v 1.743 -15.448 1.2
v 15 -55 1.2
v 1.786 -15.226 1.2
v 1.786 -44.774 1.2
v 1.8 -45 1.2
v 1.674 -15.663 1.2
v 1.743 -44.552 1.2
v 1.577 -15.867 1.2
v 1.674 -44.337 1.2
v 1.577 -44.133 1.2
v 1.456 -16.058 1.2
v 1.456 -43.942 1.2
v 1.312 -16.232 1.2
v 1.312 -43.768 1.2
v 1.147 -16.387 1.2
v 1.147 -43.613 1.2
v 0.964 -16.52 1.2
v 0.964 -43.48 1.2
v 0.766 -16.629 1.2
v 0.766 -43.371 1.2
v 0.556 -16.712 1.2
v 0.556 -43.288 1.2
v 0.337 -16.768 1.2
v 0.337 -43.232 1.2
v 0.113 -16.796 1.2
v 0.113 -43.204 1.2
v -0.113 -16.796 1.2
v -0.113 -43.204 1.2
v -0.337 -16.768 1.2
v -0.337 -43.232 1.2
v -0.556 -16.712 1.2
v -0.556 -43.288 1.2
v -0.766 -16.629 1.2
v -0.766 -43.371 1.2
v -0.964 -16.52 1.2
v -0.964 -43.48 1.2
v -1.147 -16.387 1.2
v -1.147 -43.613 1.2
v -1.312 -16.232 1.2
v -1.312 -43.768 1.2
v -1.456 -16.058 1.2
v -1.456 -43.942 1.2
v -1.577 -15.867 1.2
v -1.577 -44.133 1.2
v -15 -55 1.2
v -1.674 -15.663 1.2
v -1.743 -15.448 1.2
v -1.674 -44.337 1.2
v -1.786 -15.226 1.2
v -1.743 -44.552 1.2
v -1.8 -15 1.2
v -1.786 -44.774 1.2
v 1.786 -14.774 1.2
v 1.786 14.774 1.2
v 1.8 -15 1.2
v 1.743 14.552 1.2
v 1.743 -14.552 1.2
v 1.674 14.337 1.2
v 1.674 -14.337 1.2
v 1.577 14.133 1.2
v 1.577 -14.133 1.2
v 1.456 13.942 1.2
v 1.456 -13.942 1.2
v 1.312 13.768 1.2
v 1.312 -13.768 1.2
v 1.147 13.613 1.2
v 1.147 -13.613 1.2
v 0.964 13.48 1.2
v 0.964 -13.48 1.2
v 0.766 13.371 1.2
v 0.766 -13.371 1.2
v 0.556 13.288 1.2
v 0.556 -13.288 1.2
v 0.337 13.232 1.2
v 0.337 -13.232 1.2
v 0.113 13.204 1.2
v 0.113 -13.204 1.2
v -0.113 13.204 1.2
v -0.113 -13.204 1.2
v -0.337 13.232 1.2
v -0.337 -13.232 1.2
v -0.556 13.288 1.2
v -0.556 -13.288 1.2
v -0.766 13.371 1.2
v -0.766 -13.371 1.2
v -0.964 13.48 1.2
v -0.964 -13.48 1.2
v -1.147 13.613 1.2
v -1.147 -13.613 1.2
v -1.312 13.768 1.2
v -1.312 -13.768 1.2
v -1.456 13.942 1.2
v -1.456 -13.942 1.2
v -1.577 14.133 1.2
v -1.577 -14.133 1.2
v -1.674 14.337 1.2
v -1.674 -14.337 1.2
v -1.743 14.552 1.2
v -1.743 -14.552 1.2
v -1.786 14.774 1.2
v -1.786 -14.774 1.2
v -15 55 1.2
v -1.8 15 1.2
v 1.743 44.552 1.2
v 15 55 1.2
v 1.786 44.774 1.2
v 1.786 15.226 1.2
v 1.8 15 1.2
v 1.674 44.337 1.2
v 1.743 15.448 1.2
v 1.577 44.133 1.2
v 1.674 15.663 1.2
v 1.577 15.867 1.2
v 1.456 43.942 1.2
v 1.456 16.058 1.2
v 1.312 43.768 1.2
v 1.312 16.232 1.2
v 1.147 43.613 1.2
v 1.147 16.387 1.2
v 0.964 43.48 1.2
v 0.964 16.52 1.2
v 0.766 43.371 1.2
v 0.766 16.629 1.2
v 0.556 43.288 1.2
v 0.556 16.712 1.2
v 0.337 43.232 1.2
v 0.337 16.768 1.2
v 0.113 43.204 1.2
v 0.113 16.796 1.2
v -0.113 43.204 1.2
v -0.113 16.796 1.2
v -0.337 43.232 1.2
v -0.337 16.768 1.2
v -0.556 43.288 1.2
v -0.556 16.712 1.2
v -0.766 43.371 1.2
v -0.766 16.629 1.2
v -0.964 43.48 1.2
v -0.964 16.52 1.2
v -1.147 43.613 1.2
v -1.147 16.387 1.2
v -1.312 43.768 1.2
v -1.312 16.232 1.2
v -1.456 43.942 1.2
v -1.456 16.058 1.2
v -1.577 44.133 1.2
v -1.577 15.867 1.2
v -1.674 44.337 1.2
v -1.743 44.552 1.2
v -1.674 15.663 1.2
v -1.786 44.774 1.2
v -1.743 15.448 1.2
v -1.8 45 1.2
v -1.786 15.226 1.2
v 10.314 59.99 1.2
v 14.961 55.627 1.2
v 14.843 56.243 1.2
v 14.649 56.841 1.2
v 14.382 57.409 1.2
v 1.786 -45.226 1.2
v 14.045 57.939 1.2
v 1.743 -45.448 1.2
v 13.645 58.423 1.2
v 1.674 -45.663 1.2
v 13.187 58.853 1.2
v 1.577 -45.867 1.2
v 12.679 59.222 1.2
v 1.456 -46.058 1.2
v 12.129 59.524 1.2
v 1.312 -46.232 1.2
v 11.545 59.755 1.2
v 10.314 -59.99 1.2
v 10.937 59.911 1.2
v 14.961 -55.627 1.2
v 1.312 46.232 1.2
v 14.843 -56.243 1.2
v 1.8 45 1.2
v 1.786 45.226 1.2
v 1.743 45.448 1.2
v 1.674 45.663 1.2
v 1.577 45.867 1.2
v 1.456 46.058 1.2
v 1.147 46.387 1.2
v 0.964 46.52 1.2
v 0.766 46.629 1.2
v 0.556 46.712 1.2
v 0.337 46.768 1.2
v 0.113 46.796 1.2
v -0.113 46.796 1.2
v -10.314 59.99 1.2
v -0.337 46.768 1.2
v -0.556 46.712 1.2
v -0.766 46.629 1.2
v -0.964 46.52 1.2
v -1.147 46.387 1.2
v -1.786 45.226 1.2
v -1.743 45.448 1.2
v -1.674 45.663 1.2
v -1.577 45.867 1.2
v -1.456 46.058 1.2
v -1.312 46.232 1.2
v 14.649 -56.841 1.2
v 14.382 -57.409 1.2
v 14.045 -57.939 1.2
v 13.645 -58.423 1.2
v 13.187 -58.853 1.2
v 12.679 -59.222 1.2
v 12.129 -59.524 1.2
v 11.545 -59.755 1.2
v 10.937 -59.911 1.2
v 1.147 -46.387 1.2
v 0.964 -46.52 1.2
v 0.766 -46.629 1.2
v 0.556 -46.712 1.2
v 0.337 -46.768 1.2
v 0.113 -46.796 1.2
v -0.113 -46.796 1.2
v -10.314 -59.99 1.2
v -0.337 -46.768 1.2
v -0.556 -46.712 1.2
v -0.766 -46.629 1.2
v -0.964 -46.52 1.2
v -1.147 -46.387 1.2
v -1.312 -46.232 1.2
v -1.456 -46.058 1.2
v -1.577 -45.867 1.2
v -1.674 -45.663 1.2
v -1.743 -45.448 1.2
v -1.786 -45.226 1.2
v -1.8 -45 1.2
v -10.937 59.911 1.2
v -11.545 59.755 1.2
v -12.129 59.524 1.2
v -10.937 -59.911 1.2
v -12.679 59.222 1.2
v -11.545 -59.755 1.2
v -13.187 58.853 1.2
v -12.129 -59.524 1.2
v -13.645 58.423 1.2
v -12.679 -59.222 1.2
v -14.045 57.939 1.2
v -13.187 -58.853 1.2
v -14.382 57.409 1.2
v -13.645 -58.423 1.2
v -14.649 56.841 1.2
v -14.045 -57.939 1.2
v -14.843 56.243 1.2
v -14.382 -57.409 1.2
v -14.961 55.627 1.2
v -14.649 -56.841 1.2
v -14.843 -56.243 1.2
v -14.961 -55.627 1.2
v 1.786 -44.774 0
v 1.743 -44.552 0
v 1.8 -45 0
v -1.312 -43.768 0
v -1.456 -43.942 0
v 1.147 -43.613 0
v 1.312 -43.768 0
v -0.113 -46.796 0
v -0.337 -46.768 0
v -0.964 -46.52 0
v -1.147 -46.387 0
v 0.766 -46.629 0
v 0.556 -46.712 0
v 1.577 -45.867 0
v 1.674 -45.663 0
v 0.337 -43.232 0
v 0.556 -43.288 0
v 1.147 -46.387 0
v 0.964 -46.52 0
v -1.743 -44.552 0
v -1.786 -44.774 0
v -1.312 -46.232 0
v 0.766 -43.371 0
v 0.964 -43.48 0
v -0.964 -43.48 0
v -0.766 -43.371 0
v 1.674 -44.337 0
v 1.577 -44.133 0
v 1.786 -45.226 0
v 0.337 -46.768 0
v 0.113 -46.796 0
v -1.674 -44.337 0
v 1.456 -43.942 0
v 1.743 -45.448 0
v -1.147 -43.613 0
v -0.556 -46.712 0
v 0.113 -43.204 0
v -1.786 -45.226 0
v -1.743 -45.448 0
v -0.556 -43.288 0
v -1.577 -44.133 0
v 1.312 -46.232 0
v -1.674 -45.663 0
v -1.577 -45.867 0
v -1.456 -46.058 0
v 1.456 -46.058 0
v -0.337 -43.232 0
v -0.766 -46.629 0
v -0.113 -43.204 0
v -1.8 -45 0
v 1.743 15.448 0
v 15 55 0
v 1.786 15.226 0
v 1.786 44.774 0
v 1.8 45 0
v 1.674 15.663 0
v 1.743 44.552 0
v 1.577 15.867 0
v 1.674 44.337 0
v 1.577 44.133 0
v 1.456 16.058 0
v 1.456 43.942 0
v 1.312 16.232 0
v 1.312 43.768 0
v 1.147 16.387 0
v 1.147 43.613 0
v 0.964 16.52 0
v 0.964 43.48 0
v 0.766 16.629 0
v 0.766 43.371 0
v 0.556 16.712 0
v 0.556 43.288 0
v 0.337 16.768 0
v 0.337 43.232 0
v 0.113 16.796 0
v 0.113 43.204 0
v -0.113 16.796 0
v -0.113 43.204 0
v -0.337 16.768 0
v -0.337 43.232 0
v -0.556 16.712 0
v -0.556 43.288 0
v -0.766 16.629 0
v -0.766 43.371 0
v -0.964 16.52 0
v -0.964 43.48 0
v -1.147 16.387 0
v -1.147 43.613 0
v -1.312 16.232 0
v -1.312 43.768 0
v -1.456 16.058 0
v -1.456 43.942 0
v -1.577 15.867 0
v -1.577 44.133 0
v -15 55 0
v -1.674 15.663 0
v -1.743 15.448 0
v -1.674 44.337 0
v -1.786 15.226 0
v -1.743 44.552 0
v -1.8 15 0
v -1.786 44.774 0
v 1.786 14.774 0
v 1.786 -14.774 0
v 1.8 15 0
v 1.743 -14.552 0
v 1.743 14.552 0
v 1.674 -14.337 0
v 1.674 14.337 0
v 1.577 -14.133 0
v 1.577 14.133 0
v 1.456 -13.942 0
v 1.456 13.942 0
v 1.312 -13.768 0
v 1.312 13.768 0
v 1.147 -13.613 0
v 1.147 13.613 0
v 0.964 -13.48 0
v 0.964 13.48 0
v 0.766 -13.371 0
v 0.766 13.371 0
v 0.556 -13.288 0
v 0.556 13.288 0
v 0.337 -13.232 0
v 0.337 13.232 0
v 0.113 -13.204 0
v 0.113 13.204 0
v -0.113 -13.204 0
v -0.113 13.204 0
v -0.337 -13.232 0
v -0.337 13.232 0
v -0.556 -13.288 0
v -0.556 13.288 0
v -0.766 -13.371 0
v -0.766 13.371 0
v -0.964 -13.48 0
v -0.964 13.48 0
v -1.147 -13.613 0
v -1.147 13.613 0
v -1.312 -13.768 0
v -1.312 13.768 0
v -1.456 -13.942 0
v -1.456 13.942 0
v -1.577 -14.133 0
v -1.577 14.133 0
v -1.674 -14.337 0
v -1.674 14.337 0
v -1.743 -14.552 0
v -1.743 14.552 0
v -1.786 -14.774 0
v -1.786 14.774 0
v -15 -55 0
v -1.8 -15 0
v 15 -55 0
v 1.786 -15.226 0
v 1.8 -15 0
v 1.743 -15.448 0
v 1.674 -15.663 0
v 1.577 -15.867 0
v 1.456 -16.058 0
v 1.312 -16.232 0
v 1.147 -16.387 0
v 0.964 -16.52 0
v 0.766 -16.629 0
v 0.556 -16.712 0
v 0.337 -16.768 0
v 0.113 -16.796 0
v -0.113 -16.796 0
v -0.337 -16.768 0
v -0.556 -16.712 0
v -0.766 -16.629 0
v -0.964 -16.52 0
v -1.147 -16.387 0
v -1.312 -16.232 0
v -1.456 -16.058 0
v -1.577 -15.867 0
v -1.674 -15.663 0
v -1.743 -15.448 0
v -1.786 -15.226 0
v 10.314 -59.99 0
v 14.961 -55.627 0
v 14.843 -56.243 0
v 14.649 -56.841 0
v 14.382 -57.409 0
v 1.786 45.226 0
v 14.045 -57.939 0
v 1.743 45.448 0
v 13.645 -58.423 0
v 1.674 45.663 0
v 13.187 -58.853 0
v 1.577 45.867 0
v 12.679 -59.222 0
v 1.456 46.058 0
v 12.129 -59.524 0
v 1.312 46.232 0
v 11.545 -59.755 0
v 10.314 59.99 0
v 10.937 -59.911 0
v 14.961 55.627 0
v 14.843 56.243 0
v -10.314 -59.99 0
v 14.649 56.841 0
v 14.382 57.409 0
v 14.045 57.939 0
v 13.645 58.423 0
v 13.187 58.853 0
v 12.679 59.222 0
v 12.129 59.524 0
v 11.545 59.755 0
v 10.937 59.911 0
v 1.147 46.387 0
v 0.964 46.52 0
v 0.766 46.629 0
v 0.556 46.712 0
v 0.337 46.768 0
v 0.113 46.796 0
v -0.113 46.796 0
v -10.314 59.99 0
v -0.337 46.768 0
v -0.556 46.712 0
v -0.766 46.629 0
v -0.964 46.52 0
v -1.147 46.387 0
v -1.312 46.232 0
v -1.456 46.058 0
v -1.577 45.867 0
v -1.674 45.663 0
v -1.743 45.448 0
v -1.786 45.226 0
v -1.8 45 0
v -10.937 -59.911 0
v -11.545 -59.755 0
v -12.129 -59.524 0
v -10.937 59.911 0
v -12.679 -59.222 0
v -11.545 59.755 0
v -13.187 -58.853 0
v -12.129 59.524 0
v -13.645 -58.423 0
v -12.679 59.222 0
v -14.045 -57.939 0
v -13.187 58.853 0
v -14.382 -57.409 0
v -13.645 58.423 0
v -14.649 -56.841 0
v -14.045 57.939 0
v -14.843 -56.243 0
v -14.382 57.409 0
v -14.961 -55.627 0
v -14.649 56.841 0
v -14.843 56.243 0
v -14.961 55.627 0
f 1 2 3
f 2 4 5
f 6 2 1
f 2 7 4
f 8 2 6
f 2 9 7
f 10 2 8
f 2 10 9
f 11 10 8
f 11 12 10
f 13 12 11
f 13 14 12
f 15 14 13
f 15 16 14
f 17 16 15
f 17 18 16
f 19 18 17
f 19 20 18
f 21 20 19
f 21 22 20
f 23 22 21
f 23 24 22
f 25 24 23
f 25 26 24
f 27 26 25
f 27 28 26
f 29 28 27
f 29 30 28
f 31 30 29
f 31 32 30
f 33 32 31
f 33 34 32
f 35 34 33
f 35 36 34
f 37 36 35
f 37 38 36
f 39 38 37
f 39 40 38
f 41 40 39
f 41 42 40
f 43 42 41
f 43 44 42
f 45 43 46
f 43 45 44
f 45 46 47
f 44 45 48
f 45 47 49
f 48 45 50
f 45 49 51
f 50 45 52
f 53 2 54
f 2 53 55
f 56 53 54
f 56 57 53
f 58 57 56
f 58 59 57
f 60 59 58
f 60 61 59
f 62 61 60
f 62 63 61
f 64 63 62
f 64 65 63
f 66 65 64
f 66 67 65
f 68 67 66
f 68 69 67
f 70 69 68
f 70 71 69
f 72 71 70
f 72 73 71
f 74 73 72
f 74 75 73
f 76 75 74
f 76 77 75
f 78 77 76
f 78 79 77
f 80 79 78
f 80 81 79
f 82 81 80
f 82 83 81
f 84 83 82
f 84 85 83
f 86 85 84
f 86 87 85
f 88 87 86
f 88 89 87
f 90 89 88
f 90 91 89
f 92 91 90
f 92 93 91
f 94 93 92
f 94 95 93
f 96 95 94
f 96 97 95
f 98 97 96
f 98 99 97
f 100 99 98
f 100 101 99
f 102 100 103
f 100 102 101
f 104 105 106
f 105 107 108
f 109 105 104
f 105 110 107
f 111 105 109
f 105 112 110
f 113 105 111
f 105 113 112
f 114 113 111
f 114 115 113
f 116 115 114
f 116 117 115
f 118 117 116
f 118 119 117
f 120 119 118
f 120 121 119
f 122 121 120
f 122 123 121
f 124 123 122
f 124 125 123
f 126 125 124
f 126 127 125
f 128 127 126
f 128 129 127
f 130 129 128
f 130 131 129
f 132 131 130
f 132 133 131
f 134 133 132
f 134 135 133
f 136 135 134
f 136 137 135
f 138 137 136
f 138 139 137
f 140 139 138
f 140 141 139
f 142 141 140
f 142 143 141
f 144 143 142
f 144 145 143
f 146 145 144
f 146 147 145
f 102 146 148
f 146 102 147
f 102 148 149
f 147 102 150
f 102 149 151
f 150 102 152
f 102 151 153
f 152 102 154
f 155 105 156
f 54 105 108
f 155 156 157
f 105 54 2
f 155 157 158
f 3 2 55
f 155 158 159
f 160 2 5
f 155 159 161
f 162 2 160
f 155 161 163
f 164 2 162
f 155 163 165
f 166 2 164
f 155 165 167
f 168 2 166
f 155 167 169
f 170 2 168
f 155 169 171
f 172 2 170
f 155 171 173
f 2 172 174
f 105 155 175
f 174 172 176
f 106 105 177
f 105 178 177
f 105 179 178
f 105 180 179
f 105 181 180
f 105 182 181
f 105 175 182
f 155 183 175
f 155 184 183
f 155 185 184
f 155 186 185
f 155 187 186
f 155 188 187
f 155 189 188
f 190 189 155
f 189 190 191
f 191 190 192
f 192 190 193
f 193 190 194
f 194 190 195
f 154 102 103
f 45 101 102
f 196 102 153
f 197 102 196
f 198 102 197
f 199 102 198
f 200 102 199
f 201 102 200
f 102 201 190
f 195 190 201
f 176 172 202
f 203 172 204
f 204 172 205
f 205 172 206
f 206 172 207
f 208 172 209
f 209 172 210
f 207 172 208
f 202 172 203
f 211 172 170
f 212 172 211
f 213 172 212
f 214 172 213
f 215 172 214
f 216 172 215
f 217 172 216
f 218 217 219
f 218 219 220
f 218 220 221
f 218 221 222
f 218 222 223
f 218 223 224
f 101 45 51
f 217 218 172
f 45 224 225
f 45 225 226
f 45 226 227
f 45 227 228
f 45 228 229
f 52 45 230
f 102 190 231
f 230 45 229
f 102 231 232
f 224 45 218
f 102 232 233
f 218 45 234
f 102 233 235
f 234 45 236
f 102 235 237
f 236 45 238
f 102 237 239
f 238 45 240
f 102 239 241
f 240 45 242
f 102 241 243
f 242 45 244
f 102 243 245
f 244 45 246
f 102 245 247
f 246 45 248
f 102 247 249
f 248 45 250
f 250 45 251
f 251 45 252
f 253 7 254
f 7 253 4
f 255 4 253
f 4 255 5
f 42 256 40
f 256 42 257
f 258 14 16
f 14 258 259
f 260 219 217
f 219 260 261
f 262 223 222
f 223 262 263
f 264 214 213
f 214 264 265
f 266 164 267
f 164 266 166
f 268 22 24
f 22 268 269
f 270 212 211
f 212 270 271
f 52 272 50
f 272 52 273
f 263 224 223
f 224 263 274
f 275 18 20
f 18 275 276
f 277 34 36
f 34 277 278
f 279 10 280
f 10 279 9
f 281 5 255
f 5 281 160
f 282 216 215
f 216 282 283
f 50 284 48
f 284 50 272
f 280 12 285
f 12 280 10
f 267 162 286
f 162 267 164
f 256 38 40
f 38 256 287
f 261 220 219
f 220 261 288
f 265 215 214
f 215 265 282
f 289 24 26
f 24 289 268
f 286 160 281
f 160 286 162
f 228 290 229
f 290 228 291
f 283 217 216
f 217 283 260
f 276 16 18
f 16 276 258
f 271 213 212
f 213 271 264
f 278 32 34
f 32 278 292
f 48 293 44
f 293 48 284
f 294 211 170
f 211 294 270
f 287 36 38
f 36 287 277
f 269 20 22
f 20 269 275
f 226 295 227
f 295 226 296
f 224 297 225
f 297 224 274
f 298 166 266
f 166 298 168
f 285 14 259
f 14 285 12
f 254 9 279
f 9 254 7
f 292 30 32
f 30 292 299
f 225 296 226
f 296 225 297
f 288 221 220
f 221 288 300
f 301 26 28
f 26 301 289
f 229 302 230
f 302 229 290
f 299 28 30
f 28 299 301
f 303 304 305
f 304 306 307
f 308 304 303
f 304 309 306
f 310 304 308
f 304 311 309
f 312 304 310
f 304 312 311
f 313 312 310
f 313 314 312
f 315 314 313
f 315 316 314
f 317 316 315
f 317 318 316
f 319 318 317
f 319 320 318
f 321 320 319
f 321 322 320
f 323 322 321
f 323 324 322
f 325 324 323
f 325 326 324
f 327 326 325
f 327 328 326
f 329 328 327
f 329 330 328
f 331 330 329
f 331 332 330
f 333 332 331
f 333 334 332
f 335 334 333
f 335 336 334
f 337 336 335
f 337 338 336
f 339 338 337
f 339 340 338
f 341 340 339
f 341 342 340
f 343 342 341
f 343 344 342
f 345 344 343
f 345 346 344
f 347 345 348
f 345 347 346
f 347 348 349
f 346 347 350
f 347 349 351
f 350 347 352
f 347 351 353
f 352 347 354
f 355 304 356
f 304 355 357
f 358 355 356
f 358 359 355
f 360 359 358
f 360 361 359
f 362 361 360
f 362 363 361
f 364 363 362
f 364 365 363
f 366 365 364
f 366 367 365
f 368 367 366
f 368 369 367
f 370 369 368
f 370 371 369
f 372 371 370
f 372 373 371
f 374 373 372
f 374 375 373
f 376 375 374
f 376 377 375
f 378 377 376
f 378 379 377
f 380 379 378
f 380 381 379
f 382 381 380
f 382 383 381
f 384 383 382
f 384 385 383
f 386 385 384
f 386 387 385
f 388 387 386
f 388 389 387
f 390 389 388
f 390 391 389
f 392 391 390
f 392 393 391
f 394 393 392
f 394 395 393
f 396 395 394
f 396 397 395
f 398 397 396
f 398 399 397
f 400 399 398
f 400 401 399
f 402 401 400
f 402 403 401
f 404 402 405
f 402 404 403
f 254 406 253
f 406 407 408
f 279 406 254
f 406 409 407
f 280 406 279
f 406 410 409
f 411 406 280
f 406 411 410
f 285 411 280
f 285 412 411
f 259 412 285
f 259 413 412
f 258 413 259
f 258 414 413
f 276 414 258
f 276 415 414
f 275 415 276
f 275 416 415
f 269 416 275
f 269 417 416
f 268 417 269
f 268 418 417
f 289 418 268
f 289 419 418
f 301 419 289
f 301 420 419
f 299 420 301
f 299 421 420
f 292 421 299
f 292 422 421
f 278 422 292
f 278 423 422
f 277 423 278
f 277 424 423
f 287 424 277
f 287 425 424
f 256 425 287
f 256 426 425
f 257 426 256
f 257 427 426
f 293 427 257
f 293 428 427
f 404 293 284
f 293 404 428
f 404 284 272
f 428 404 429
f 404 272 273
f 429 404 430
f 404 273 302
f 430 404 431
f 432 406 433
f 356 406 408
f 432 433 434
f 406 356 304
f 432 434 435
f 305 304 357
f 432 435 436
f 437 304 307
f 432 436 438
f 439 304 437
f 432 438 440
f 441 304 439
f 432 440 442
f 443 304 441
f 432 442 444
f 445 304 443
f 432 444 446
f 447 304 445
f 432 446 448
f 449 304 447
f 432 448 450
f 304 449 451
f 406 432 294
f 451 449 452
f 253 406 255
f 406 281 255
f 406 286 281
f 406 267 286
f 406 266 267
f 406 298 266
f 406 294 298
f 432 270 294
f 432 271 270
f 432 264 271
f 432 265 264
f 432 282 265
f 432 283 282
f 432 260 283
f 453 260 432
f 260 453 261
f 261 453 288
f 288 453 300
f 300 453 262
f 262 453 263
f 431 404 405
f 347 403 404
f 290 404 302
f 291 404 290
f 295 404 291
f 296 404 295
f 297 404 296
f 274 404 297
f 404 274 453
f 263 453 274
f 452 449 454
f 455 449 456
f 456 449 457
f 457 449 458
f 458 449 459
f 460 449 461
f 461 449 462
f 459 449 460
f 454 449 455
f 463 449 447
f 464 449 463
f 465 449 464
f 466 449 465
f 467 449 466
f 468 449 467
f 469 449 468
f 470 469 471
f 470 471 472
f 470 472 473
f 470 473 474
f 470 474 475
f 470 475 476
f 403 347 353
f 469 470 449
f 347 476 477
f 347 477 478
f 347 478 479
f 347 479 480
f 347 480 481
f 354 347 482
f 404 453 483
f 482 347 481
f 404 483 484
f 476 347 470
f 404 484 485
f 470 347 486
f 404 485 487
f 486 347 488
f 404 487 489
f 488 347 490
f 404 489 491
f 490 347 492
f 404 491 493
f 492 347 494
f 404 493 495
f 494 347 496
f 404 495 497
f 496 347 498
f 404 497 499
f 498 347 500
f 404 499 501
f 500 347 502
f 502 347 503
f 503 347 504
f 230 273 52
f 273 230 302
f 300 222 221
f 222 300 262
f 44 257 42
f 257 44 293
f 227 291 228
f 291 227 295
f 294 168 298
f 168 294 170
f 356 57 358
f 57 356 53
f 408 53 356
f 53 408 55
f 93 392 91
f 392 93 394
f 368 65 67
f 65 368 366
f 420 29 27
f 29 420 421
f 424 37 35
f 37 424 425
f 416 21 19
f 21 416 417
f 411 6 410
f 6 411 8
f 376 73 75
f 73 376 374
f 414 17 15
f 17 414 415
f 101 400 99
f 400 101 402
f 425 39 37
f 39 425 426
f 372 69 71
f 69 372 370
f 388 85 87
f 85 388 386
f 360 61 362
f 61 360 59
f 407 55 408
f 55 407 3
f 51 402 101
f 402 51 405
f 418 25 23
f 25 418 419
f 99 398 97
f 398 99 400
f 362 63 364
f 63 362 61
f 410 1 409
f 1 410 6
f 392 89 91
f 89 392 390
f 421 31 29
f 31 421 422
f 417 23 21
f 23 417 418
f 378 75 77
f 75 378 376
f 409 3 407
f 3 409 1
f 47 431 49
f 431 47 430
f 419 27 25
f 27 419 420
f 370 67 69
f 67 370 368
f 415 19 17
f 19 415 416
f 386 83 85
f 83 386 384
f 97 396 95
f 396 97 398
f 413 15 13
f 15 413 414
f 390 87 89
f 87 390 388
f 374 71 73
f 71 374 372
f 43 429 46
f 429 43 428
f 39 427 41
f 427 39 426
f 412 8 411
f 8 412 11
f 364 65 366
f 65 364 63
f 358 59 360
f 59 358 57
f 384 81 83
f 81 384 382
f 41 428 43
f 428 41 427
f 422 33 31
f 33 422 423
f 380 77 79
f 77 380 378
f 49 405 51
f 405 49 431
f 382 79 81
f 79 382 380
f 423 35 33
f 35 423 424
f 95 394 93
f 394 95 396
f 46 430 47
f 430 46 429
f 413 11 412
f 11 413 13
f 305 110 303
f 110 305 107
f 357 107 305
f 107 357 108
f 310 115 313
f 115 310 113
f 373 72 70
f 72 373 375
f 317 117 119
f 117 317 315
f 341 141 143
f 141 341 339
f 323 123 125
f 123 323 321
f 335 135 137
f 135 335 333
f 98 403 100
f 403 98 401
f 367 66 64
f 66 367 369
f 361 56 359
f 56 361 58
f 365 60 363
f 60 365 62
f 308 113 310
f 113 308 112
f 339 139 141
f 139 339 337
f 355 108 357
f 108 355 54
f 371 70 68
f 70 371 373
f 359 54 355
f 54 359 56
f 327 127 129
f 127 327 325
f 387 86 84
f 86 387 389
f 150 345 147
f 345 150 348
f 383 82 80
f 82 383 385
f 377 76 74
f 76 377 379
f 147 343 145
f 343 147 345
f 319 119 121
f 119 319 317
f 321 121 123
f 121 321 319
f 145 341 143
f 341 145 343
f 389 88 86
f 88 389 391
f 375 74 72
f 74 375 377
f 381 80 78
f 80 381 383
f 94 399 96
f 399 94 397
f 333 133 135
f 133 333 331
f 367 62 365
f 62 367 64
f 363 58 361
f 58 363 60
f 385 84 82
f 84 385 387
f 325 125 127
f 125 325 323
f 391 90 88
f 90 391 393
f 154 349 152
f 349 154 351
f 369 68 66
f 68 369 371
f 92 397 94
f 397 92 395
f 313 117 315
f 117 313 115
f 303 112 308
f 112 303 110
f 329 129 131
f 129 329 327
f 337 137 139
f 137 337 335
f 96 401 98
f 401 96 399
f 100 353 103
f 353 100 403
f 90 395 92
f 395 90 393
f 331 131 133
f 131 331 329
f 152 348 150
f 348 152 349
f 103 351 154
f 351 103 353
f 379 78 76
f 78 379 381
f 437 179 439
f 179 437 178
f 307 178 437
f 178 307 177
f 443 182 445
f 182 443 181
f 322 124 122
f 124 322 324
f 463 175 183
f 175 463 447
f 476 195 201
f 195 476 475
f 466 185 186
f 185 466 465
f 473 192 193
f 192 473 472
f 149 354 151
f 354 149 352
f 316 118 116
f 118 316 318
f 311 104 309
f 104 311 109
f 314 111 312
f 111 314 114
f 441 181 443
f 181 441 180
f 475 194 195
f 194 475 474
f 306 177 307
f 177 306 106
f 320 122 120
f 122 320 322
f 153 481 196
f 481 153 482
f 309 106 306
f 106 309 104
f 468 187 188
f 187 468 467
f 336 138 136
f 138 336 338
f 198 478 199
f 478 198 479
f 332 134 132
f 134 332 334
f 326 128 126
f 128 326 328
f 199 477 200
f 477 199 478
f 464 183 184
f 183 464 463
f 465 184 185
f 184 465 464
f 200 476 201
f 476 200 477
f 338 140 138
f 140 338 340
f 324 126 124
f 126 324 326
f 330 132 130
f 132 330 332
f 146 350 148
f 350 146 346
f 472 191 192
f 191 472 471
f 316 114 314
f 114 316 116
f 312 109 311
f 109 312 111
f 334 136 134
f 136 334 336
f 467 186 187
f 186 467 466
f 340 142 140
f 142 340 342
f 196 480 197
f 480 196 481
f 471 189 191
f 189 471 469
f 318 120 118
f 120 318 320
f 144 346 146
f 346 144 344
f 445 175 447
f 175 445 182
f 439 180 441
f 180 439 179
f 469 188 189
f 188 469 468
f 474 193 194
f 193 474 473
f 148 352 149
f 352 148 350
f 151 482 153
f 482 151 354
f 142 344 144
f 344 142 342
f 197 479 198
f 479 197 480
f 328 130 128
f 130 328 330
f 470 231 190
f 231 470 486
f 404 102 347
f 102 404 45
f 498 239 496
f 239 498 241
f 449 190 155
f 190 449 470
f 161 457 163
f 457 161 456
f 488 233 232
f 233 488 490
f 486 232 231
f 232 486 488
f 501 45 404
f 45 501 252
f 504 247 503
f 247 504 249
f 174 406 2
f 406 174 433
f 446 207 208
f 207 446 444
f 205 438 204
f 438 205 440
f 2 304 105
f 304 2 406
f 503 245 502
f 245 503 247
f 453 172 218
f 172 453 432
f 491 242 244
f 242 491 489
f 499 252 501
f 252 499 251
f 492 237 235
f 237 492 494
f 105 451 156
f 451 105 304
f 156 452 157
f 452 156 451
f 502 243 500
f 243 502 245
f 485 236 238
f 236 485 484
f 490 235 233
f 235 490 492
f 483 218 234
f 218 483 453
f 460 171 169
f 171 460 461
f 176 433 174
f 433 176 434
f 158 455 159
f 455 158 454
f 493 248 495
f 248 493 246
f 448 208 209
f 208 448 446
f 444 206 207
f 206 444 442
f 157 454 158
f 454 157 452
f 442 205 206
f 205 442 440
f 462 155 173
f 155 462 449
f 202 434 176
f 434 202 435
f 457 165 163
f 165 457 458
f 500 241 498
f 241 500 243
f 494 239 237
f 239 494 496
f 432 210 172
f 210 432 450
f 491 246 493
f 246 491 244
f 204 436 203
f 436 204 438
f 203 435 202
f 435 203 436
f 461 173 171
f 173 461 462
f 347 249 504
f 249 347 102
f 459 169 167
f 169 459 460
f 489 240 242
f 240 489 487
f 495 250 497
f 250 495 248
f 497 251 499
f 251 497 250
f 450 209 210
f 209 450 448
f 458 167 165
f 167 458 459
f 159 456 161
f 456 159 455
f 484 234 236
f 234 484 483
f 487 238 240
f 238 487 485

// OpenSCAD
$fn = 50;


difference() {
	union() {
		hull() {
			translate(v = [-10.0000000000, 55.0000000000, 0]) {
				cylinder(h = 27, r = 5);
			}
			translate(v = [10.0000000000, 55.0000000000, 0]) {
				cylinder(h = 27, r = 5);
			}
			translate(v = [-10.0000000000, -55.0000000000, 0]) {
				cylinder(h = 27, r = 5);
			}
			translate(v = [10.0000000000, -55.0000000000, 0]) {
				cylinder(h = 27, r = 5);
			}
		}
	}
	union() {
		translate(v = [0, 0, 1.2000000000]) {
			hull() {
				translate(v = [-10.0000000000, 55.0000000000, 0]) {
					cylinder(h = 25.8000000000, r = 3.8000000000);
				}
				translate(v = [10.0000000000, 55.0000000000, 0]) {
					cylinder(h = 25.8000000000, r = 3.8000000000);
				}
				translate(v = [-10.0000000000, -55.0000000000, 0]) {
					cylinder(h = 25.8000000000, r = 3.8000000000);
				}
				translate(v = [10.0000000000, -55.0000000000, 0]) {
					cylinder(h = 25.8000000000, r = 3.8000000000);
				}
			}
		}
		#translate(v = [0.0000000000, -45.0000000000, 0]) {
			cylinder(h = 1.2000000000, r = 1.8000000000);
		}
		#translate(v = [0.0000000000, -15.0000000000, 0]) {
			cylinder(h = 1.2000000000, r = 1.8000000000);
		}
		#translate(v = [0.0000000000, 15.0000000000, 0]) {
			cylinder(h = 1.2000000000, r = 1.8000000000);
		}
		#translate(v = [0.0000000000, 45.0000000000, 0]) {
			cylinder(h = 1.2000000000, r = 1.8000000000);
		}
		translate(v = [-250.0000000000, -250.0000000000, 1.2000000000]) {
			cube(size = [500, 500, 500]);
		}
		translate(v = [-250.0000000000, -250.0000000000, 1.2000000000]) {
			cube(size = [500, 500, 500]);
		}
		translate(v = [-250.0000000000, -250.0000000000, 1.2000000000]) {
			cube(size = [500, 500, 500]);
		}
	}
}
